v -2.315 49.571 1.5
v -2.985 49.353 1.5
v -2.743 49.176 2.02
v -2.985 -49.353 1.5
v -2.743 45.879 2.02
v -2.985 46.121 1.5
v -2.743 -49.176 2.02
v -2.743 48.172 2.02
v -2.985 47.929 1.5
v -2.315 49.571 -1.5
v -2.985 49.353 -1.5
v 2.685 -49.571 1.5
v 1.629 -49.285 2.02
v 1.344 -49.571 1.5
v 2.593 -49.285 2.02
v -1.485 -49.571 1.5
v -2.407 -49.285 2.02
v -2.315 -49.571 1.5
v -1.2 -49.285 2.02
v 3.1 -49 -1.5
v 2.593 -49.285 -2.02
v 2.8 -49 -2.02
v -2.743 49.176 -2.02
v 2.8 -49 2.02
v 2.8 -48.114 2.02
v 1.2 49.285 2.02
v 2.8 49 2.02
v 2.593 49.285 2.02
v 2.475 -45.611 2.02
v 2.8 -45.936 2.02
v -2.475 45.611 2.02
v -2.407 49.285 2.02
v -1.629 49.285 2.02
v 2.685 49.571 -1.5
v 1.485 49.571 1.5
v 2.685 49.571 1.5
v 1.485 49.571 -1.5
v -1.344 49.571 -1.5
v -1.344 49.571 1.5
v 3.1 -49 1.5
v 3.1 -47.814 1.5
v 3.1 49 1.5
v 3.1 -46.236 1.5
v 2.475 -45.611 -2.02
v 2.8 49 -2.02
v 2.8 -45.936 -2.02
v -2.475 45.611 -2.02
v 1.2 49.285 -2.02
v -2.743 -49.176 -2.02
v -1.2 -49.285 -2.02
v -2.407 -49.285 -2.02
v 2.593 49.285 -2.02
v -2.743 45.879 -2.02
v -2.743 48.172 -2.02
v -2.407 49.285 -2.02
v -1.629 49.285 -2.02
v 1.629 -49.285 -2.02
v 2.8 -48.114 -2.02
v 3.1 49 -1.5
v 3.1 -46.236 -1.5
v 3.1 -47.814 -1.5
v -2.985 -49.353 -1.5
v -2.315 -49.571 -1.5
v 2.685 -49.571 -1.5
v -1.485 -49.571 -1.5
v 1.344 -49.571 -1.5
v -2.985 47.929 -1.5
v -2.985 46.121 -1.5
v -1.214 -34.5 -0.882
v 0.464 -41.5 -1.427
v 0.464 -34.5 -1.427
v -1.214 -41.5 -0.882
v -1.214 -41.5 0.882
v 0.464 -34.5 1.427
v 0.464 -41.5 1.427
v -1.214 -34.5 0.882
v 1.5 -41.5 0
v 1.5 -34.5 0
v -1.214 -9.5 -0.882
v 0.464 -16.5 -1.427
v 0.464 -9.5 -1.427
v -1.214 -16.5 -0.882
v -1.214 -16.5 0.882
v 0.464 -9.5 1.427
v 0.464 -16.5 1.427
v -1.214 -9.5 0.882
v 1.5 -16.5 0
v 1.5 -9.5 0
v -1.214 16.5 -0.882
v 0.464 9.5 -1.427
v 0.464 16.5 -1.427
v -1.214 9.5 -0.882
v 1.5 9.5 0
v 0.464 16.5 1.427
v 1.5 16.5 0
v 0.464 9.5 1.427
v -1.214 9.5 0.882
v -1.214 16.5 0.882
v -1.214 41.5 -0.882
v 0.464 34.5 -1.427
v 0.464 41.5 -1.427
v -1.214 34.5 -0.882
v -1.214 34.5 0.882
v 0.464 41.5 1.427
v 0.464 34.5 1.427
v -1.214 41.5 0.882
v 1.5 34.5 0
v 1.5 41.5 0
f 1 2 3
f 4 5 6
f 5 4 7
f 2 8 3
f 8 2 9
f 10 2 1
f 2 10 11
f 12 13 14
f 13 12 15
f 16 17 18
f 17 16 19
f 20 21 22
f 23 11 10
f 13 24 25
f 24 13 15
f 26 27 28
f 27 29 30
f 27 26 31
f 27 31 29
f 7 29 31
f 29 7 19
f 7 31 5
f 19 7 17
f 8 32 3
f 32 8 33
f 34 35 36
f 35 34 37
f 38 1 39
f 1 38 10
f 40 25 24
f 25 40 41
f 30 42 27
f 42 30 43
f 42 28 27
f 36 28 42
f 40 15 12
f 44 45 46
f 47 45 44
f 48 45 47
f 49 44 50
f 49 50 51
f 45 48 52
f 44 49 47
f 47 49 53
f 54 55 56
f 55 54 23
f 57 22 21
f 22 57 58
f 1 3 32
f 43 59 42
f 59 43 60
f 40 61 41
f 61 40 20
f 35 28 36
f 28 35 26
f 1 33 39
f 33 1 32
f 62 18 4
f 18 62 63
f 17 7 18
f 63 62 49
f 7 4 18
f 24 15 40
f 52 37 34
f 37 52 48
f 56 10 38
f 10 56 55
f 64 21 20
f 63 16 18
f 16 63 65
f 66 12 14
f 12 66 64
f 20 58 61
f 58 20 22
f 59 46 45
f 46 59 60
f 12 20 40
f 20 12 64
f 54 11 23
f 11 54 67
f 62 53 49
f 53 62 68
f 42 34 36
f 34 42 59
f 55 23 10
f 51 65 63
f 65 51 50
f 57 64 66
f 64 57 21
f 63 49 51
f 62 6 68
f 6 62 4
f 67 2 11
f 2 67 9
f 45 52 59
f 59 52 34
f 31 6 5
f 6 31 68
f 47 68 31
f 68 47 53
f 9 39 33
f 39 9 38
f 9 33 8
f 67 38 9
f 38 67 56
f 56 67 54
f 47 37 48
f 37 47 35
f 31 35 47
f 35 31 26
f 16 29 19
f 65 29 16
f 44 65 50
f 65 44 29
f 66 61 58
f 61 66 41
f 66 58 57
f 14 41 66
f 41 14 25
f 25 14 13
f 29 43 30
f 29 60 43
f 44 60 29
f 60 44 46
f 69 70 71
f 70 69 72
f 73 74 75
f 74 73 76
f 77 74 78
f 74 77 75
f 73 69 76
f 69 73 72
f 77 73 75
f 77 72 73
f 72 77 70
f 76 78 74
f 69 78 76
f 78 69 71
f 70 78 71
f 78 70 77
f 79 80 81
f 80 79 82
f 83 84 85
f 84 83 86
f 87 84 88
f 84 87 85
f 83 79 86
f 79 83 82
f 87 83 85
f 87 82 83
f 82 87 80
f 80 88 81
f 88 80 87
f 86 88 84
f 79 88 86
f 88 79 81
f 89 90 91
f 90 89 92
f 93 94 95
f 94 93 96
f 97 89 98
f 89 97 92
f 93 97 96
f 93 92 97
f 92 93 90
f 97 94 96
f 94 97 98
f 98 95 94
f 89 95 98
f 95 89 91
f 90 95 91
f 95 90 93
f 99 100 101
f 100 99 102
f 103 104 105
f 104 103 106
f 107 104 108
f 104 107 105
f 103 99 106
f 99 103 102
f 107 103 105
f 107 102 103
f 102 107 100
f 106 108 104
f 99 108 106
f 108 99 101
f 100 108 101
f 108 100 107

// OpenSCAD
// Parameters
rail_length = 100.0; //[50.0:200.0:1]
rail_width = 7.0; //[3.5:14.0:0.1]
rail_height = 5.0; //[2.5:10.0:0.1]
hole_diameter = 3.0; //[1.5:6.0:0.1]
hole_count = 4; //[2:8:1]
end_margin = 12.0; //[6.0:24.0:1]
hole_pitch = 25.0; //[10.0:50.0:1]
chamfer_length = 2.0; //[0.5:5.0:0.1]
fillet_radius = 0.6; //[0.2:1.5:0.1]
fillet_trim = 1.0; //[0.5:3.0:0.1]
overlap = 1.0; //[0.5:2.0:0.1]

// Rail Body
module rail_body() {
  color("Silver")
  translate([0, 0, 0])
    cube([rail_width, rail_length, rail_height], center=true);
}

// Mounting Holes
module mounting_hole(position_y) {
  translate([0, position_y, 0])
    rotate([90, 0, 0])
      cylinder(h=rail_height + 2*overlap, r=hole_diameter/2, center=true);
}

module mounting_holes() {
  union() {
    mounting_hole(-rail_length/2 + end_margin);
    mounting_hole(-rail_length/2 + end_margin + hole_pitch);
    mounting_hole(rail_length/2 - end_margin - hole_pitch);
    mounting_hole(rail_length/2 - end_margin);
  }
}

// End Chamfers
module end_chamfer(position_y) {
  translate([0, position_y, 0])
    rotate([0, 0, 45])
      cube([rail_width + 2*overlap, chamfer_length, rail_height + 2*overlap], center=true);
}

module end_chamfers() {
  difference() {
    edge_fillets();
    end_chamfer(rail_length/2 - chamfer_length/2 + overlap/2);
    end_chamfer(-rail_length/2 + chamfer_length/2 - overlap/2);
  }
}

// Edge Fillets
module edge_fillets() {
  minkowski() {
    translate([0, 0, 0])
      cube([rail_width - 2*fillet_trim, rail_length - 2*fillet_trim, rail_height - 2*fillet_trim], center=true);
    sphere(r=fillet_radius, center=true);
  }
}

// Complete Model
module complete_model() {
  difference() {
    end_chamfers();
    mounting_holes();
  }
}

// Final Output
complete_model();
